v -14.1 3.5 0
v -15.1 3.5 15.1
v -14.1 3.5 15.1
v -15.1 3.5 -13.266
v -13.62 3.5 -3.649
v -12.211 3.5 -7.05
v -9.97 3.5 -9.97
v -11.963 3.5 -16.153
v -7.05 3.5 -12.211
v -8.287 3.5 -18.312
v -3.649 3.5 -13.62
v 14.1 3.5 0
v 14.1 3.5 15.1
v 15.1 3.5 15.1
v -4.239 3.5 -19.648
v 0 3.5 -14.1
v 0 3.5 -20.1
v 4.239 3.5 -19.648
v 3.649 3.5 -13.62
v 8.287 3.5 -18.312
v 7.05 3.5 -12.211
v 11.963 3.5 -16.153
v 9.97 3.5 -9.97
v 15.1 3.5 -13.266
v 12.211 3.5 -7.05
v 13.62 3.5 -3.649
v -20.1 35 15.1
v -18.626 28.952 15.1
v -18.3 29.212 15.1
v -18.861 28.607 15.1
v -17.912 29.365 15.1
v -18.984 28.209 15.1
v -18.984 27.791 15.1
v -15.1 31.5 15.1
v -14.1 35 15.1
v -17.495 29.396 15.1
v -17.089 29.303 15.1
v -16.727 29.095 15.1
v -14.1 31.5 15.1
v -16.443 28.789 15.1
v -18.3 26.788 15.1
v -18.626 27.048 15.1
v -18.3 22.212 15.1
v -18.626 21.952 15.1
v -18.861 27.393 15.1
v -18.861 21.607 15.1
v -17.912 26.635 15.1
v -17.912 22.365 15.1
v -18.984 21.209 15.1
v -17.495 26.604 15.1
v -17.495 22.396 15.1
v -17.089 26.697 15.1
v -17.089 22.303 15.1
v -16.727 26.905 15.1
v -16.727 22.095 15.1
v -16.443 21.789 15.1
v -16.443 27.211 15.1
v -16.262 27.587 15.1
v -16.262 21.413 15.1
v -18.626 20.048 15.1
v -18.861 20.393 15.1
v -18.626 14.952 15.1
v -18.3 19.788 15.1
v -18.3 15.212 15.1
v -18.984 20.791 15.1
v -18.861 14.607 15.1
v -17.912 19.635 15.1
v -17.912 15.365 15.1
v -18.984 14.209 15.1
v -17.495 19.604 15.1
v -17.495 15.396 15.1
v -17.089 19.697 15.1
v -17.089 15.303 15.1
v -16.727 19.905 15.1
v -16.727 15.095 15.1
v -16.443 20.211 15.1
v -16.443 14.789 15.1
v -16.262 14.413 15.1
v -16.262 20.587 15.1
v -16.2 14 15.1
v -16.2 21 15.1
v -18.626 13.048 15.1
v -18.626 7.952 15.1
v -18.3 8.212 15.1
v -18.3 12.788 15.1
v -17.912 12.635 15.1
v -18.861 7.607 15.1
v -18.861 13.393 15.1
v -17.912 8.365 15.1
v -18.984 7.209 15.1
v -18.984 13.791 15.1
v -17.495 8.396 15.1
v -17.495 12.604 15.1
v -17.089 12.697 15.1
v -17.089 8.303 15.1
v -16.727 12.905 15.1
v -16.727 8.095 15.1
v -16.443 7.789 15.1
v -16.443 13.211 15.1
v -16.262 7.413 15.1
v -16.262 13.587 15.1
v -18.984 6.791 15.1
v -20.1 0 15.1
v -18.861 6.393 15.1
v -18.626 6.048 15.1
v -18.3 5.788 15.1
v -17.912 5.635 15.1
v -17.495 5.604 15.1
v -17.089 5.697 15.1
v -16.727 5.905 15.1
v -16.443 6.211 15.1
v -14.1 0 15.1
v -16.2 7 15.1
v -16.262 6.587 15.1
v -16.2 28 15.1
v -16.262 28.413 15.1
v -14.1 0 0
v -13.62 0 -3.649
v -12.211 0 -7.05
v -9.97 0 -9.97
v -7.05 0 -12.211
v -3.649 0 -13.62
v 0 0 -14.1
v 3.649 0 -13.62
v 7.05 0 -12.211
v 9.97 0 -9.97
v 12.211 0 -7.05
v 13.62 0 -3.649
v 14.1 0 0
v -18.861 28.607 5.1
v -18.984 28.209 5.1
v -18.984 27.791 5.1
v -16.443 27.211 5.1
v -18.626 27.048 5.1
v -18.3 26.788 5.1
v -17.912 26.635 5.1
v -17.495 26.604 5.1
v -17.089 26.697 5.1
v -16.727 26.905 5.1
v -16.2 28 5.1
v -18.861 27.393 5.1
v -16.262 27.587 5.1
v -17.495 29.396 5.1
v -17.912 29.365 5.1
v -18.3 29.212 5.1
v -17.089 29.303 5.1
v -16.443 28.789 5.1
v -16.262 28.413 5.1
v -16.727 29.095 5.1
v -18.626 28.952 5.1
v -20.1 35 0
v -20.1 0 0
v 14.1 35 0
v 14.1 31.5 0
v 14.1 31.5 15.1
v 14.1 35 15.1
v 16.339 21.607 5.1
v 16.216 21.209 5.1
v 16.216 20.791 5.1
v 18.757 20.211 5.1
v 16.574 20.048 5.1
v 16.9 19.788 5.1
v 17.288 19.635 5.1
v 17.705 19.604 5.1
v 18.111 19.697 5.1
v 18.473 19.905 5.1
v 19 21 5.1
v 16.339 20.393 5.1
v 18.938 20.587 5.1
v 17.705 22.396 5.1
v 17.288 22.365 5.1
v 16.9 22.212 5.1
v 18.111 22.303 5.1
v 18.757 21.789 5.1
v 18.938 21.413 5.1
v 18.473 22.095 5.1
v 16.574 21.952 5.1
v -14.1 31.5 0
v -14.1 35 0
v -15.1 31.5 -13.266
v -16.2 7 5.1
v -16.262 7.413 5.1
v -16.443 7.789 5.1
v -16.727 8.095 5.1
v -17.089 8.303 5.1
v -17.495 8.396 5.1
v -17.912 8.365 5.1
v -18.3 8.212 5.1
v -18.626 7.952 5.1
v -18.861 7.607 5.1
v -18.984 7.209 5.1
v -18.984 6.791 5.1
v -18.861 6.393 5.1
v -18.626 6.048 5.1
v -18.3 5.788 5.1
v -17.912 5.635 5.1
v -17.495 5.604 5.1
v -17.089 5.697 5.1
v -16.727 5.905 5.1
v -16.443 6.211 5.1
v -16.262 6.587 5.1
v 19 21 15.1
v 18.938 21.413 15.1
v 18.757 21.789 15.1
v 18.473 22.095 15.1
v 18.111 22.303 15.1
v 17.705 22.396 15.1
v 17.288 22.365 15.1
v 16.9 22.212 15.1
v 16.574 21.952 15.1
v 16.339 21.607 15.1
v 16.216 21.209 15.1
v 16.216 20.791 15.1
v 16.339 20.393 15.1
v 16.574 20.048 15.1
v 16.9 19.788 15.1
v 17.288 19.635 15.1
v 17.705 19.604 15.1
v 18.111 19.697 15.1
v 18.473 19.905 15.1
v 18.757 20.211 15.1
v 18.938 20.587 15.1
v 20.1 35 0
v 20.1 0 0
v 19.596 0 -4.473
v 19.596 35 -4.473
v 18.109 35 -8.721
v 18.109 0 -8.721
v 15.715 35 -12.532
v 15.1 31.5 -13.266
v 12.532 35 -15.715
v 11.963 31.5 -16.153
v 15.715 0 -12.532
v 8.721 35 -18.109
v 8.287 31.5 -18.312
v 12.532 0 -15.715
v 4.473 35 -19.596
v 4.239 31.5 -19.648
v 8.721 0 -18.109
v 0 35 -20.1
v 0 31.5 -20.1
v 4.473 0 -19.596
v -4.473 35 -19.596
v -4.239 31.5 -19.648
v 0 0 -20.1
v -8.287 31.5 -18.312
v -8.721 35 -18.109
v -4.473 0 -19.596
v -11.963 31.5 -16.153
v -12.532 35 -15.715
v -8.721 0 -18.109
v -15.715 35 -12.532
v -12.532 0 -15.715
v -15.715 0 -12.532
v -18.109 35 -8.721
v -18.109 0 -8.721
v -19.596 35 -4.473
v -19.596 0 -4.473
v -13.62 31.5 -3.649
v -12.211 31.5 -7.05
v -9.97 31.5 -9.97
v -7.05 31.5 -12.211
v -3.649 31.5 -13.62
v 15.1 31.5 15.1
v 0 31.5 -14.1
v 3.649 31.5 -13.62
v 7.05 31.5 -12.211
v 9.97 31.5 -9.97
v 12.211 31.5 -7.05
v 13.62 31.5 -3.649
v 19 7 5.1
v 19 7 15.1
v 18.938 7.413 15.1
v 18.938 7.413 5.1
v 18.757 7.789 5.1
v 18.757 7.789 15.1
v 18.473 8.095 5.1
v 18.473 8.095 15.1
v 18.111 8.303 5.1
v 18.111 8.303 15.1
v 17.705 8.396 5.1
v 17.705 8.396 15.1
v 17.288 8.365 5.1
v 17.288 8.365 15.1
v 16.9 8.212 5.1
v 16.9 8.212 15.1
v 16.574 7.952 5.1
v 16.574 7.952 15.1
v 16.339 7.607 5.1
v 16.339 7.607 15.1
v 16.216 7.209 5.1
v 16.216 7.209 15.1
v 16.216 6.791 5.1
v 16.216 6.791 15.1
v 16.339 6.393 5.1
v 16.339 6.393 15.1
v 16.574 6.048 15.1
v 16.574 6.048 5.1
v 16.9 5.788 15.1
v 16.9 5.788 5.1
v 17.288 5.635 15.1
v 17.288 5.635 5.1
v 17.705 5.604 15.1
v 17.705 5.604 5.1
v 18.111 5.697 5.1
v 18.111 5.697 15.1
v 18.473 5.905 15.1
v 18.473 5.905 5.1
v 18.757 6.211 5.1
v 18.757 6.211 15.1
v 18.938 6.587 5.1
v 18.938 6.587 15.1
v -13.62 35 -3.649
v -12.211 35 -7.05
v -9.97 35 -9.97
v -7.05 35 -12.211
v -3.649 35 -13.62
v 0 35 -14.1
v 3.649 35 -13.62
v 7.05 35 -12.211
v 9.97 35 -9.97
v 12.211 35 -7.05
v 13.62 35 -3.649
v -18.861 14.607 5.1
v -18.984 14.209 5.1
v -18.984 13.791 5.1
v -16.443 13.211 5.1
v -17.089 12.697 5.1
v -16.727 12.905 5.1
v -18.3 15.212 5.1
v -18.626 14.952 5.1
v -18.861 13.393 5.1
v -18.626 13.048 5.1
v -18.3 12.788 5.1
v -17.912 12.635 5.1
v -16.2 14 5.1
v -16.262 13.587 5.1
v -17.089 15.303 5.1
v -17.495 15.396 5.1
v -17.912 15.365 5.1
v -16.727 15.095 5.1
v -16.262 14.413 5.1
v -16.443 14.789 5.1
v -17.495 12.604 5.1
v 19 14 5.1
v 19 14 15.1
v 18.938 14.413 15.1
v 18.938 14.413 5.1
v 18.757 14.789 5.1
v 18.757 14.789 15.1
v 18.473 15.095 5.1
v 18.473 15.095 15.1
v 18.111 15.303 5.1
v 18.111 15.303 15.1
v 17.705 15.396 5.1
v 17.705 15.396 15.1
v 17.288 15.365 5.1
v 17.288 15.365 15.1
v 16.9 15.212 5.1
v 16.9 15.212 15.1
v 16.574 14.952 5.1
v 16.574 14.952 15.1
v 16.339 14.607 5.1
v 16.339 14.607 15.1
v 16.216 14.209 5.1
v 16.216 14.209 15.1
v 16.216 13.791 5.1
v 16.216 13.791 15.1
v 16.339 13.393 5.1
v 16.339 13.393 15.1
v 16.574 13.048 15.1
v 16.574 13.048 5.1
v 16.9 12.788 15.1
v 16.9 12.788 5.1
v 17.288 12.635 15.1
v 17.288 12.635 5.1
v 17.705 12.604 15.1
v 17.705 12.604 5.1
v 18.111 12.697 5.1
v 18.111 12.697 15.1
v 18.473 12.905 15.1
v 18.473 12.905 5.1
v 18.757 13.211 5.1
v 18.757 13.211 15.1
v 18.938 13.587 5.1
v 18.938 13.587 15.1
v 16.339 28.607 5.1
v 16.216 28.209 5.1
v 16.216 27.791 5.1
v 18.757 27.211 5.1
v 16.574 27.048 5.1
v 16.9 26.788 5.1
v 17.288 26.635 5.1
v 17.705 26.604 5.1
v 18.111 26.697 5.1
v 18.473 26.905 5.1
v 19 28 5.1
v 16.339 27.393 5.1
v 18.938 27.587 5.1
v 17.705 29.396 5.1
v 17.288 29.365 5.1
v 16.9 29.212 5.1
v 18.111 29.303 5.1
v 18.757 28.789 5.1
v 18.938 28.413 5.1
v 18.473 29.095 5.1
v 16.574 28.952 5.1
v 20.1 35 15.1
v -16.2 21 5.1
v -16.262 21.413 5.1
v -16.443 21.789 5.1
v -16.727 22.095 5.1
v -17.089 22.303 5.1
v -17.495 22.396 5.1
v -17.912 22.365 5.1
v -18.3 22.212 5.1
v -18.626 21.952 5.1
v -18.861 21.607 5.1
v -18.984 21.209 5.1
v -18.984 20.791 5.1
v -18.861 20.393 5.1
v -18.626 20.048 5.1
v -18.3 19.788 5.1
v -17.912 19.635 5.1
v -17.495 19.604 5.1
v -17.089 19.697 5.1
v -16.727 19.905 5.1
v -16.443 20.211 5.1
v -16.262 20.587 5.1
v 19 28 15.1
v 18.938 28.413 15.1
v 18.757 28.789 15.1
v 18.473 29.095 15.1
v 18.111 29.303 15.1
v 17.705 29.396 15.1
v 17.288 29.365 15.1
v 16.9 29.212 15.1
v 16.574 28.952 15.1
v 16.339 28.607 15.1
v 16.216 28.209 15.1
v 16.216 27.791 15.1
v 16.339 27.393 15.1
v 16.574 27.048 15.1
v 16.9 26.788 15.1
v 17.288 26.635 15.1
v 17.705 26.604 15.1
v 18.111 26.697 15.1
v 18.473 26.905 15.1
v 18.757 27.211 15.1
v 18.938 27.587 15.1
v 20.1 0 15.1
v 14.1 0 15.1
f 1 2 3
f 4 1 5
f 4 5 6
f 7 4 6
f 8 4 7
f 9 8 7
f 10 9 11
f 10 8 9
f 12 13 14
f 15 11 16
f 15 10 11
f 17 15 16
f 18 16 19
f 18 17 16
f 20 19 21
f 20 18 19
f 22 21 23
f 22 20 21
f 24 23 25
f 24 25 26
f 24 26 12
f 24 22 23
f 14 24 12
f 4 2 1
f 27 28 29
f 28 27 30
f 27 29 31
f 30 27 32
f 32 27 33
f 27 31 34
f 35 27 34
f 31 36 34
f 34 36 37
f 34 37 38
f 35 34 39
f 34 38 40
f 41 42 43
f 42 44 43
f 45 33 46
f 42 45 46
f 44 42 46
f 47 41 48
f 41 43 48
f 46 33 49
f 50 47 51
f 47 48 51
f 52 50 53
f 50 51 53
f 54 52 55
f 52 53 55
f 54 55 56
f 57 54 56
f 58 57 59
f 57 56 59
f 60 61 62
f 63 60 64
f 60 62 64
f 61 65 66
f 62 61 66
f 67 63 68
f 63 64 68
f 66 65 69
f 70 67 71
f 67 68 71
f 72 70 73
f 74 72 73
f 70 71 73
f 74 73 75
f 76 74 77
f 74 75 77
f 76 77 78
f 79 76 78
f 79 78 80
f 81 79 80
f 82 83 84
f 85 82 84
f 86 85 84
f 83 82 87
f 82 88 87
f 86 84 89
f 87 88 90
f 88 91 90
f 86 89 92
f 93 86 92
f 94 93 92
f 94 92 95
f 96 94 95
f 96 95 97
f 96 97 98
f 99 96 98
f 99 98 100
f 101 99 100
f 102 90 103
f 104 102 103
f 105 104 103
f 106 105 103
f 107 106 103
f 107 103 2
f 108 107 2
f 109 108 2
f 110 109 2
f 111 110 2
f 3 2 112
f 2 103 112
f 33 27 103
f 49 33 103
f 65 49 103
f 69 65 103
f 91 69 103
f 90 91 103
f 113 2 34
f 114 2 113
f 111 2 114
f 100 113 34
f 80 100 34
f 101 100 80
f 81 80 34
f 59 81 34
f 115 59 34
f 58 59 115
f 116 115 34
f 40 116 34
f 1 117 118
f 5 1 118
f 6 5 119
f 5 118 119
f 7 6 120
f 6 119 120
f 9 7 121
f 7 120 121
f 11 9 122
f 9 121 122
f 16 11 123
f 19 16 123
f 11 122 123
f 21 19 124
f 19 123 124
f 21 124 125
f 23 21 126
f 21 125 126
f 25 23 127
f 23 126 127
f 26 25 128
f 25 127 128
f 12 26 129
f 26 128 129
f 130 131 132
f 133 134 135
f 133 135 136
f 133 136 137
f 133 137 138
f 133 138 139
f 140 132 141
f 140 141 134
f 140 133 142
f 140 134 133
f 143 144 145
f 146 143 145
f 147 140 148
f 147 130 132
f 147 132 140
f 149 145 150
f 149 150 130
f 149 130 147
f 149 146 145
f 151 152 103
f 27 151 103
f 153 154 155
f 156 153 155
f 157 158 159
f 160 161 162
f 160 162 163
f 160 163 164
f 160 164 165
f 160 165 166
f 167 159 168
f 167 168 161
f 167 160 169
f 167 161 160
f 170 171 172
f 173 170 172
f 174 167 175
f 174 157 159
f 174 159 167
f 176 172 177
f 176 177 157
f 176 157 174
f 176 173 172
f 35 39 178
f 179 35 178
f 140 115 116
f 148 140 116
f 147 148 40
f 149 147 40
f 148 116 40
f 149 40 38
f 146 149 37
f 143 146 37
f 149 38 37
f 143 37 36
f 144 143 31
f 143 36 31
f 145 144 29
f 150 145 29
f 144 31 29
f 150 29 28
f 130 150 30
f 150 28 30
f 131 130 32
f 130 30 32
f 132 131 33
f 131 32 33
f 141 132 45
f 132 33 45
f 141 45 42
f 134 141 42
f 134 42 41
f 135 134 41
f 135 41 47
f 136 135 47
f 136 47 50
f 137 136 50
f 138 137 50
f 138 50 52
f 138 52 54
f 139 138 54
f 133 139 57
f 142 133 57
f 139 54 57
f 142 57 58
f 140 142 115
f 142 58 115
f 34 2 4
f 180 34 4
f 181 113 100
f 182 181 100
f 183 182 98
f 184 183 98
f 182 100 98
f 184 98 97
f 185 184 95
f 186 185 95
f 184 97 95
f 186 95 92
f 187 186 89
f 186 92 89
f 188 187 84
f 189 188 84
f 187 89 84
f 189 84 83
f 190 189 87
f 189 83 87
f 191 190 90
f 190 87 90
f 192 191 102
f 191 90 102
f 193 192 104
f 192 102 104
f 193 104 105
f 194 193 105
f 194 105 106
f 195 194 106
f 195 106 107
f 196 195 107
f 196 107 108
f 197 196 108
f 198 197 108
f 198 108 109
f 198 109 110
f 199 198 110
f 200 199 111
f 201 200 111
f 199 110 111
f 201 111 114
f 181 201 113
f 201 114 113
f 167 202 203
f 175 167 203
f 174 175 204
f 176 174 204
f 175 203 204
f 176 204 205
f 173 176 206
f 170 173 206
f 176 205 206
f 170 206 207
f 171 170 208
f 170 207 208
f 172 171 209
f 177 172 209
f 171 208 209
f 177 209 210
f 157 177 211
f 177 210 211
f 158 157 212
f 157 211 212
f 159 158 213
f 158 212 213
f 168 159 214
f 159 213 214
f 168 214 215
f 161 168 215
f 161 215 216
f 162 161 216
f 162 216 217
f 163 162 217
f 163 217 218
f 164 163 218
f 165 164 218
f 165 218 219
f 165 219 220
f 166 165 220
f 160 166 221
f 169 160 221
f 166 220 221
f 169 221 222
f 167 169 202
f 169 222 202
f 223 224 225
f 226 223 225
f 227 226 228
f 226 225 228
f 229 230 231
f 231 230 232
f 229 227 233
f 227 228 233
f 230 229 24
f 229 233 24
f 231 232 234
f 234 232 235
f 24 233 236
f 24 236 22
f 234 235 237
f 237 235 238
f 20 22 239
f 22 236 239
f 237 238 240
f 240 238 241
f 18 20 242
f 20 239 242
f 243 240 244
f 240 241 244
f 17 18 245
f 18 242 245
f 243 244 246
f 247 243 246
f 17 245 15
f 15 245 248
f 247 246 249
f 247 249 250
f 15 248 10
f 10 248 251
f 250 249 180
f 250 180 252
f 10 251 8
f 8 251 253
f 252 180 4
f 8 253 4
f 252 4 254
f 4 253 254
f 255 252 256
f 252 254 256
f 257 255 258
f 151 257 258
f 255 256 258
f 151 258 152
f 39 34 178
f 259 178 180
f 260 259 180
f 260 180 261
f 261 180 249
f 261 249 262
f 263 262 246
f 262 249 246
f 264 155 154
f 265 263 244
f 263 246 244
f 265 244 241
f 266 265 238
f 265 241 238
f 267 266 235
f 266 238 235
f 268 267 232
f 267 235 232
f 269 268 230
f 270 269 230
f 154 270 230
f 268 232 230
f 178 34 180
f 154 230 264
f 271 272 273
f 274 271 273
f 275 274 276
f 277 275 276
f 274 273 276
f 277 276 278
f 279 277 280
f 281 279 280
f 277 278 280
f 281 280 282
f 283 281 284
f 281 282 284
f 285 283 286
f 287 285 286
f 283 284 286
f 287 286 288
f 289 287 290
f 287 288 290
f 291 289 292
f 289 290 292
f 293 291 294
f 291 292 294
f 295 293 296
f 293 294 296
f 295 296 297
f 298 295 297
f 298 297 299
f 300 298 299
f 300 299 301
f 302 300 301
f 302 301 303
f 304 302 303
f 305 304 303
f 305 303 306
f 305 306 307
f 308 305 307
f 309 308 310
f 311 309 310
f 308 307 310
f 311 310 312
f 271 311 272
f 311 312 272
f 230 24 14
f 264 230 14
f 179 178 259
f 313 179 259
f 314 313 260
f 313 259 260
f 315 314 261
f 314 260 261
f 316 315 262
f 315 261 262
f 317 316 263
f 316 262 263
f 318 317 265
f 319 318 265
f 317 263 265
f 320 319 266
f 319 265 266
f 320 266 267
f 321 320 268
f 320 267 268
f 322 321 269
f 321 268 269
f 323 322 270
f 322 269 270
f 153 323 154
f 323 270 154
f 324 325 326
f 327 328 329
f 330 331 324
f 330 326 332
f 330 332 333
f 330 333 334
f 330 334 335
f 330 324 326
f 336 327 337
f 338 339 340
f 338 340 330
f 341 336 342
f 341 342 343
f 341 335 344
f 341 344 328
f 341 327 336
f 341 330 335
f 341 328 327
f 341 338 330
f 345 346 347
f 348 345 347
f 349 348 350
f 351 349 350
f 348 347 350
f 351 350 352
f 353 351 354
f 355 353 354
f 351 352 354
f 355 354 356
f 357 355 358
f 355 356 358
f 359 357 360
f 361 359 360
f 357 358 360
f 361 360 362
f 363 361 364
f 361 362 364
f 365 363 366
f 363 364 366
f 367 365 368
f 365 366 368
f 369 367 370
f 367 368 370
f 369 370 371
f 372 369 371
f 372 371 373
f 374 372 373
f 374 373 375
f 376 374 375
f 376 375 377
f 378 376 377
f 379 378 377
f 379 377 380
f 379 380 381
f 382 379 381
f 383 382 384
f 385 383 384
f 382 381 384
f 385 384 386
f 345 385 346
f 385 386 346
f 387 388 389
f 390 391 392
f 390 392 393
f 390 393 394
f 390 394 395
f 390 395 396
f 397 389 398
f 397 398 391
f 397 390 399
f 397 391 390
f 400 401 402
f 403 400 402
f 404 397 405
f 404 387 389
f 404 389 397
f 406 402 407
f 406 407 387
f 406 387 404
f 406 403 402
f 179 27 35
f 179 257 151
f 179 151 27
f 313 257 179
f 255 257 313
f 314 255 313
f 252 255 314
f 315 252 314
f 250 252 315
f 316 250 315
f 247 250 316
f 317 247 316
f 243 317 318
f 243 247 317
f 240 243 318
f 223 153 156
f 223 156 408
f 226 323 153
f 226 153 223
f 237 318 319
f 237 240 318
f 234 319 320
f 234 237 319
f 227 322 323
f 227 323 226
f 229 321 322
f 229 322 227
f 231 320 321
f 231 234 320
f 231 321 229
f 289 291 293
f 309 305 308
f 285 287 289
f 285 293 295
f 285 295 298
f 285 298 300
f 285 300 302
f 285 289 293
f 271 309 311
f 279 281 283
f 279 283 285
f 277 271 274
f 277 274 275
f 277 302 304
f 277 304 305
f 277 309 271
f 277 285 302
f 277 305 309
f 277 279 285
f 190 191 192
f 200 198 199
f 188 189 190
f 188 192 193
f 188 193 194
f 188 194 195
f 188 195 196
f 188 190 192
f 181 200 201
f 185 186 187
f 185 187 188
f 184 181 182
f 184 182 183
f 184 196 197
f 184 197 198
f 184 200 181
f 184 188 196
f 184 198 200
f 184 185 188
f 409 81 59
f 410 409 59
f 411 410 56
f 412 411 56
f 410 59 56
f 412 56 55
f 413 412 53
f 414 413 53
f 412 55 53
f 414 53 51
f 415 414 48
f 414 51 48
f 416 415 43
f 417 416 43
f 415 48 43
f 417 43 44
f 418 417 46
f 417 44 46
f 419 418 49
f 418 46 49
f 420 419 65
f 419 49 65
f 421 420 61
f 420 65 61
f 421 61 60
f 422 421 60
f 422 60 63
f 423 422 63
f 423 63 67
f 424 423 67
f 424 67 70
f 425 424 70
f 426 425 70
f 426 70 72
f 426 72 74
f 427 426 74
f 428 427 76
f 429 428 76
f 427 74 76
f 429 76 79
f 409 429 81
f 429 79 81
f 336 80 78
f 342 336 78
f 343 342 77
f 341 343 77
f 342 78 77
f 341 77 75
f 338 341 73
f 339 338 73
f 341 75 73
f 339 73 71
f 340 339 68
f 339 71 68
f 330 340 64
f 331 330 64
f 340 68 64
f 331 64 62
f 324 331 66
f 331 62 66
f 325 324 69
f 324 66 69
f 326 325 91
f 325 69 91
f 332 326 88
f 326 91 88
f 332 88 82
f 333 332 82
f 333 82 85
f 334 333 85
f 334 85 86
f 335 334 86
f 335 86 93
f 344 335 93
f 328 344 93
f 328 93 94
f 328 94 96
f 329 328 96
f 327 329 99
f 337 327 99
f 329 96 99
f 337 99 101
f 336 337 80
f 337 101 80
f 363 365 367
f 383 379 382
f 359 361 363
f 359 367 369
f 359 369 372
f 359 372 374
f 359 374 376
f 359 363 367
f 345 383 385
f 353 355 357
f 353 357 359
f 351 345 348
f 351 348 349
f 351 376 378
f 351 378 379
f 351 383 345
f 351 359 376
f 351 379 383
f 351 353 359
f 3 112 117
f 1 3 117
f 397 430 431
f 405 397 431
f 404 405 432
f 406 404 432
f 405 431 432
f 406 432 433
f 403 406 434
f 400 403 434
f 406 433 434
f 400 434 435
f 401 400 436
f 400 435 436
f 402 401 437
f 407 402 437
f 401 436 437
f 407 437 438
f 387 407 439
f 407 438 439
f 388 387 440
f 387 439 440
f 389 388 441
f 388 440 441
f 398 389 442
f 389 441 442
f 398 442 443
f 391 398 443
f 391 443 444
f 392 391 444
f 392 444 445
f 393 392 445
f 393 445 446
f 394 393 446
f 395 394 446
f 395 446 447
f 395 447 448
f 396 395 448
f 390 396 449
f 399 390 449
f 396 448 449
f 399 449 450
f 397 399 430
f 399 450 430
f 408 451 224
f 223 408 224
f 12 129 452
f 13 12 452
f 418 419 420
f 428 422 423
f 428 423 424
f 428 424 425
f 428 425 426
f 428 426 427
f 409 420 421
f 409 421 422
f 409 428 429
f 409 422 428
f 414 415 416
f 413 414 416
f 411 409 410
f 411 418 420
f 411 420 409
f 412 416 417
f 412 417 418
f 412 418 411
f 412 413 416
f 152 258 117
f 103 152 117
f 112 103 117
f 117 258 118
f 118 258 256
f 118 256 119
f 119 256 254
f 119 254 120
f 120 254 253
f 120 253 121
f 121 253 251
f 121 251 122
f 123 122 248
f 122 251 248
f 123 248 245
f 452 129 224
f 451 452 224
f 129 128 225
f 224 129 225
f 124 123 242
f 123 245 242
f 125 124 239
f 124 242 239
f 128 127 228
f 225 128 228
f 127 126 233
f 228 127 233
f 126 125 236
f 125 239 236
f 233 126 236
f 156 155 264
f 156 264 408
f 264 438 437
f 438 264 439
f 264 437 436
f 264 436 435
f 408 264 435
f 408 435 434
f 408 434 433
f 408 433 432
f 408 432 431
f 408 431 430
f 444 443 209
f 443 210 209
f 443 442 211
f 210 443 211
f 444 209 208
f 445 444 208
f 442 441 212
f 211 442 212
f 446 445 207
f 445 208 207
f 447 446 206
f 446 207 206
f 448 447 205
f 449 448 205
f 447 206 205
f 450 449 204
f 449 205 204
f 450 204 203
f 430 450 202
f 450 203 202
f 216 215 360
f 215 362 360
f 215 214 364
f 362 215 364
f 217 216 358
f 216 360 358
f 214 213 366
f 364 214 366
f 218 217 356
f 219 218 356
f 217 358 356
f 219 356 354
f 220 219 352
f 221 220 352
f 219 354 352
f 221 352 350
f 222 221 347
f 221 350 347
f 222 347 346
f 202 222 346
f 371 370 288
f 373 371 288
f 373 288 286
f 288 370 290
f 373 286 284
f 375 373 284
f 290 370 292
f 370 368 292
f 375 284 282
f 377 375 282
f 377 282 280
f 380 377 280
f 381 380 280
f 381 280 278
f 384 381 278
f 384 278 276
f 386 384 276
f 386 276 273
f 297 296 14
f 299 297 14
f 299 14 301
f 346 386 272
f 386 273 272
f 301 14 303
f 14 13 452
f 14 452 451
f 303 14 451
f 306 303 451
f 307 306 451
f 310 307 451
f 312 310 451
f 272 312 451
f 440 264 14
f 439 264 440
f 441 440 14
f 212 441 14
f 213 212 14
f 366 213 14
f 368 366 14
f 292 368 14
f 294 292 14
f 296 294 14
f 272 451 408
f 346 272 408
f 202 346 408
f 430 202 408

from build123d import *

# Parameters (mm, degrees)
BOSS_EXTRUDE1_DEPTH = 35
SKETCH2_W           = 30.2
SKETCH2_H           = 28
CUT_EXTRUDE1_DEPTH  = 54.554178175
BOSS_EXTRUDE2_START = -3.5
BOSS_EXTRUDE2_DEPTH = 3.5
BOSS_EXTRUDE3_DEPTH = 3.5
SKETCH6_R           = 1.4
CUT_EXTRUDE3_DEPTH  = 10


with BuildPart() as part:
    # Sketch1 → Boss-Extrude1 (new body)
    with BuildSketch(Plane(origin=(0, 0, 0), x_dir=(1, 0, 0), z_dir=(0, 1, 0))):
        with BuildLine():
            Line((15.1, 0), (15.1, -15.1))
            Line((15.1, -15.1), (20.1, -15.1))
            Line((20.1, -15.1), (20.1, 0))
            ThreePointArc((20.1, 0), (0, 20.1), (-20.1, 0))
            Line((-20.1, 0), (-20.1, -15.1))
            Line((-20.1, -15.1), (-15.1, -15.1))
            Line((-15.1, -15.1), (-15.1, 0))
            ThreePointArc((-15.1, 0), (0, 15.1), (15.1, 0))
        make_face()
    extrude(amount=BOSS_EXTRUDE1_DEPTH)

    # Sketch2 → Cut-Extrude1 (cut, through all)
    with BuildSketch(Plane.XY.offset(15.1)):
        with Locations((0, 17.5)):
            Rectangle(SKETCH2_W, SKETCH2_H)
    extrude(amount=-CUT_EXTRUDE1_DEPTH, mode=Mode.SUBTRACT)

    # Sketch3 → Boss-Extrude2 (add)
    with BuildSketch(Plane(origin=(0, 35, 0), x_dir=(1, 0, 0), z_dir=(0, 1, 0)).offset(BOSS_EXTRUDE2_START)):
        with BuildLine():
            Line((-15.1, 0), (-15.1, -15.1))
            Line((-15.1, -15.1), (-14.1, -15.1))
            Line((-14.1, -15.1), (-14.1, 0))
            ThreePointArc((-14.1, 0), (0, 14.1), (14.1, 0))
            Line((14.1, 0), (14.1, -15.1))
            Line((14.1, -15.1), (15.1, -15.1))
            Line((15.1, -15.1), (15.1, 0))
            ThreePointArc((15.1, 0), (0, 15.1), (-15.1, 0))
        make_face()
    extrude(amount=BOSS_EXTRUDE2_DEPTH)

    # Sketch4 → Boss-Extrude3 (add)
    with BuildSketch(Plane(origin=(0, 0, 0), x_dir=(-1, 0, 0), z_dir=(0, -1, 0))):
        with BuildLine():
            Line((15.1, 0), (15.1, -15.1))
            Line((15.1, -15.1), (14.1, -15.1))
            Line((14.1, -15.1), (14.1, 0))
            ThreePointArc((14.1, 0), (0, 14.1), (-14.1, 0))
            Line((-14.1, 0), (-14.1, -15.1))
            Line((-14.1, -15.1), (-15.1, -15.1))
            Line((-15.1, -15.1), (-15.1, 0))
            ThreePointArc((-15.1, 0), (0, 15.1), (15.1, 0))
        make_face()
    extrude(amount=-BOSS_EXTRUDE3_DEPTH)

    # Sketch6 → Cut-Extrude3 (cut)
    with BuildSketch(Plane.XY.offset(15.1)):
        with Locations((-17.6, 28)):
            Circle(SKETCH6_R)
        with Locations((17.6, 28)):
            Circle(SKETCH6_R)
        with Locations((17.6, 21)):
            Circle(SKETCH6_R)
        with Locations((17.6, 14)):
            Circle(SKETCH6_R)
        with Locations((17.6, 7)):
            Circle(SKETCH6_R)
        with Locations((-17.6, 21)):
            Circle(SKETCH6_R)
        with Locations((-17.6, 14)):
            Circle(SKETCH6_R)
        with Locations((-17.6, 7)):
            Circle(SKETCH6_R)
    extrude(amount=-CUT_EXTRUDE3_DEPTH, mode=Mode.SUBTRACT)


solid = part.part
